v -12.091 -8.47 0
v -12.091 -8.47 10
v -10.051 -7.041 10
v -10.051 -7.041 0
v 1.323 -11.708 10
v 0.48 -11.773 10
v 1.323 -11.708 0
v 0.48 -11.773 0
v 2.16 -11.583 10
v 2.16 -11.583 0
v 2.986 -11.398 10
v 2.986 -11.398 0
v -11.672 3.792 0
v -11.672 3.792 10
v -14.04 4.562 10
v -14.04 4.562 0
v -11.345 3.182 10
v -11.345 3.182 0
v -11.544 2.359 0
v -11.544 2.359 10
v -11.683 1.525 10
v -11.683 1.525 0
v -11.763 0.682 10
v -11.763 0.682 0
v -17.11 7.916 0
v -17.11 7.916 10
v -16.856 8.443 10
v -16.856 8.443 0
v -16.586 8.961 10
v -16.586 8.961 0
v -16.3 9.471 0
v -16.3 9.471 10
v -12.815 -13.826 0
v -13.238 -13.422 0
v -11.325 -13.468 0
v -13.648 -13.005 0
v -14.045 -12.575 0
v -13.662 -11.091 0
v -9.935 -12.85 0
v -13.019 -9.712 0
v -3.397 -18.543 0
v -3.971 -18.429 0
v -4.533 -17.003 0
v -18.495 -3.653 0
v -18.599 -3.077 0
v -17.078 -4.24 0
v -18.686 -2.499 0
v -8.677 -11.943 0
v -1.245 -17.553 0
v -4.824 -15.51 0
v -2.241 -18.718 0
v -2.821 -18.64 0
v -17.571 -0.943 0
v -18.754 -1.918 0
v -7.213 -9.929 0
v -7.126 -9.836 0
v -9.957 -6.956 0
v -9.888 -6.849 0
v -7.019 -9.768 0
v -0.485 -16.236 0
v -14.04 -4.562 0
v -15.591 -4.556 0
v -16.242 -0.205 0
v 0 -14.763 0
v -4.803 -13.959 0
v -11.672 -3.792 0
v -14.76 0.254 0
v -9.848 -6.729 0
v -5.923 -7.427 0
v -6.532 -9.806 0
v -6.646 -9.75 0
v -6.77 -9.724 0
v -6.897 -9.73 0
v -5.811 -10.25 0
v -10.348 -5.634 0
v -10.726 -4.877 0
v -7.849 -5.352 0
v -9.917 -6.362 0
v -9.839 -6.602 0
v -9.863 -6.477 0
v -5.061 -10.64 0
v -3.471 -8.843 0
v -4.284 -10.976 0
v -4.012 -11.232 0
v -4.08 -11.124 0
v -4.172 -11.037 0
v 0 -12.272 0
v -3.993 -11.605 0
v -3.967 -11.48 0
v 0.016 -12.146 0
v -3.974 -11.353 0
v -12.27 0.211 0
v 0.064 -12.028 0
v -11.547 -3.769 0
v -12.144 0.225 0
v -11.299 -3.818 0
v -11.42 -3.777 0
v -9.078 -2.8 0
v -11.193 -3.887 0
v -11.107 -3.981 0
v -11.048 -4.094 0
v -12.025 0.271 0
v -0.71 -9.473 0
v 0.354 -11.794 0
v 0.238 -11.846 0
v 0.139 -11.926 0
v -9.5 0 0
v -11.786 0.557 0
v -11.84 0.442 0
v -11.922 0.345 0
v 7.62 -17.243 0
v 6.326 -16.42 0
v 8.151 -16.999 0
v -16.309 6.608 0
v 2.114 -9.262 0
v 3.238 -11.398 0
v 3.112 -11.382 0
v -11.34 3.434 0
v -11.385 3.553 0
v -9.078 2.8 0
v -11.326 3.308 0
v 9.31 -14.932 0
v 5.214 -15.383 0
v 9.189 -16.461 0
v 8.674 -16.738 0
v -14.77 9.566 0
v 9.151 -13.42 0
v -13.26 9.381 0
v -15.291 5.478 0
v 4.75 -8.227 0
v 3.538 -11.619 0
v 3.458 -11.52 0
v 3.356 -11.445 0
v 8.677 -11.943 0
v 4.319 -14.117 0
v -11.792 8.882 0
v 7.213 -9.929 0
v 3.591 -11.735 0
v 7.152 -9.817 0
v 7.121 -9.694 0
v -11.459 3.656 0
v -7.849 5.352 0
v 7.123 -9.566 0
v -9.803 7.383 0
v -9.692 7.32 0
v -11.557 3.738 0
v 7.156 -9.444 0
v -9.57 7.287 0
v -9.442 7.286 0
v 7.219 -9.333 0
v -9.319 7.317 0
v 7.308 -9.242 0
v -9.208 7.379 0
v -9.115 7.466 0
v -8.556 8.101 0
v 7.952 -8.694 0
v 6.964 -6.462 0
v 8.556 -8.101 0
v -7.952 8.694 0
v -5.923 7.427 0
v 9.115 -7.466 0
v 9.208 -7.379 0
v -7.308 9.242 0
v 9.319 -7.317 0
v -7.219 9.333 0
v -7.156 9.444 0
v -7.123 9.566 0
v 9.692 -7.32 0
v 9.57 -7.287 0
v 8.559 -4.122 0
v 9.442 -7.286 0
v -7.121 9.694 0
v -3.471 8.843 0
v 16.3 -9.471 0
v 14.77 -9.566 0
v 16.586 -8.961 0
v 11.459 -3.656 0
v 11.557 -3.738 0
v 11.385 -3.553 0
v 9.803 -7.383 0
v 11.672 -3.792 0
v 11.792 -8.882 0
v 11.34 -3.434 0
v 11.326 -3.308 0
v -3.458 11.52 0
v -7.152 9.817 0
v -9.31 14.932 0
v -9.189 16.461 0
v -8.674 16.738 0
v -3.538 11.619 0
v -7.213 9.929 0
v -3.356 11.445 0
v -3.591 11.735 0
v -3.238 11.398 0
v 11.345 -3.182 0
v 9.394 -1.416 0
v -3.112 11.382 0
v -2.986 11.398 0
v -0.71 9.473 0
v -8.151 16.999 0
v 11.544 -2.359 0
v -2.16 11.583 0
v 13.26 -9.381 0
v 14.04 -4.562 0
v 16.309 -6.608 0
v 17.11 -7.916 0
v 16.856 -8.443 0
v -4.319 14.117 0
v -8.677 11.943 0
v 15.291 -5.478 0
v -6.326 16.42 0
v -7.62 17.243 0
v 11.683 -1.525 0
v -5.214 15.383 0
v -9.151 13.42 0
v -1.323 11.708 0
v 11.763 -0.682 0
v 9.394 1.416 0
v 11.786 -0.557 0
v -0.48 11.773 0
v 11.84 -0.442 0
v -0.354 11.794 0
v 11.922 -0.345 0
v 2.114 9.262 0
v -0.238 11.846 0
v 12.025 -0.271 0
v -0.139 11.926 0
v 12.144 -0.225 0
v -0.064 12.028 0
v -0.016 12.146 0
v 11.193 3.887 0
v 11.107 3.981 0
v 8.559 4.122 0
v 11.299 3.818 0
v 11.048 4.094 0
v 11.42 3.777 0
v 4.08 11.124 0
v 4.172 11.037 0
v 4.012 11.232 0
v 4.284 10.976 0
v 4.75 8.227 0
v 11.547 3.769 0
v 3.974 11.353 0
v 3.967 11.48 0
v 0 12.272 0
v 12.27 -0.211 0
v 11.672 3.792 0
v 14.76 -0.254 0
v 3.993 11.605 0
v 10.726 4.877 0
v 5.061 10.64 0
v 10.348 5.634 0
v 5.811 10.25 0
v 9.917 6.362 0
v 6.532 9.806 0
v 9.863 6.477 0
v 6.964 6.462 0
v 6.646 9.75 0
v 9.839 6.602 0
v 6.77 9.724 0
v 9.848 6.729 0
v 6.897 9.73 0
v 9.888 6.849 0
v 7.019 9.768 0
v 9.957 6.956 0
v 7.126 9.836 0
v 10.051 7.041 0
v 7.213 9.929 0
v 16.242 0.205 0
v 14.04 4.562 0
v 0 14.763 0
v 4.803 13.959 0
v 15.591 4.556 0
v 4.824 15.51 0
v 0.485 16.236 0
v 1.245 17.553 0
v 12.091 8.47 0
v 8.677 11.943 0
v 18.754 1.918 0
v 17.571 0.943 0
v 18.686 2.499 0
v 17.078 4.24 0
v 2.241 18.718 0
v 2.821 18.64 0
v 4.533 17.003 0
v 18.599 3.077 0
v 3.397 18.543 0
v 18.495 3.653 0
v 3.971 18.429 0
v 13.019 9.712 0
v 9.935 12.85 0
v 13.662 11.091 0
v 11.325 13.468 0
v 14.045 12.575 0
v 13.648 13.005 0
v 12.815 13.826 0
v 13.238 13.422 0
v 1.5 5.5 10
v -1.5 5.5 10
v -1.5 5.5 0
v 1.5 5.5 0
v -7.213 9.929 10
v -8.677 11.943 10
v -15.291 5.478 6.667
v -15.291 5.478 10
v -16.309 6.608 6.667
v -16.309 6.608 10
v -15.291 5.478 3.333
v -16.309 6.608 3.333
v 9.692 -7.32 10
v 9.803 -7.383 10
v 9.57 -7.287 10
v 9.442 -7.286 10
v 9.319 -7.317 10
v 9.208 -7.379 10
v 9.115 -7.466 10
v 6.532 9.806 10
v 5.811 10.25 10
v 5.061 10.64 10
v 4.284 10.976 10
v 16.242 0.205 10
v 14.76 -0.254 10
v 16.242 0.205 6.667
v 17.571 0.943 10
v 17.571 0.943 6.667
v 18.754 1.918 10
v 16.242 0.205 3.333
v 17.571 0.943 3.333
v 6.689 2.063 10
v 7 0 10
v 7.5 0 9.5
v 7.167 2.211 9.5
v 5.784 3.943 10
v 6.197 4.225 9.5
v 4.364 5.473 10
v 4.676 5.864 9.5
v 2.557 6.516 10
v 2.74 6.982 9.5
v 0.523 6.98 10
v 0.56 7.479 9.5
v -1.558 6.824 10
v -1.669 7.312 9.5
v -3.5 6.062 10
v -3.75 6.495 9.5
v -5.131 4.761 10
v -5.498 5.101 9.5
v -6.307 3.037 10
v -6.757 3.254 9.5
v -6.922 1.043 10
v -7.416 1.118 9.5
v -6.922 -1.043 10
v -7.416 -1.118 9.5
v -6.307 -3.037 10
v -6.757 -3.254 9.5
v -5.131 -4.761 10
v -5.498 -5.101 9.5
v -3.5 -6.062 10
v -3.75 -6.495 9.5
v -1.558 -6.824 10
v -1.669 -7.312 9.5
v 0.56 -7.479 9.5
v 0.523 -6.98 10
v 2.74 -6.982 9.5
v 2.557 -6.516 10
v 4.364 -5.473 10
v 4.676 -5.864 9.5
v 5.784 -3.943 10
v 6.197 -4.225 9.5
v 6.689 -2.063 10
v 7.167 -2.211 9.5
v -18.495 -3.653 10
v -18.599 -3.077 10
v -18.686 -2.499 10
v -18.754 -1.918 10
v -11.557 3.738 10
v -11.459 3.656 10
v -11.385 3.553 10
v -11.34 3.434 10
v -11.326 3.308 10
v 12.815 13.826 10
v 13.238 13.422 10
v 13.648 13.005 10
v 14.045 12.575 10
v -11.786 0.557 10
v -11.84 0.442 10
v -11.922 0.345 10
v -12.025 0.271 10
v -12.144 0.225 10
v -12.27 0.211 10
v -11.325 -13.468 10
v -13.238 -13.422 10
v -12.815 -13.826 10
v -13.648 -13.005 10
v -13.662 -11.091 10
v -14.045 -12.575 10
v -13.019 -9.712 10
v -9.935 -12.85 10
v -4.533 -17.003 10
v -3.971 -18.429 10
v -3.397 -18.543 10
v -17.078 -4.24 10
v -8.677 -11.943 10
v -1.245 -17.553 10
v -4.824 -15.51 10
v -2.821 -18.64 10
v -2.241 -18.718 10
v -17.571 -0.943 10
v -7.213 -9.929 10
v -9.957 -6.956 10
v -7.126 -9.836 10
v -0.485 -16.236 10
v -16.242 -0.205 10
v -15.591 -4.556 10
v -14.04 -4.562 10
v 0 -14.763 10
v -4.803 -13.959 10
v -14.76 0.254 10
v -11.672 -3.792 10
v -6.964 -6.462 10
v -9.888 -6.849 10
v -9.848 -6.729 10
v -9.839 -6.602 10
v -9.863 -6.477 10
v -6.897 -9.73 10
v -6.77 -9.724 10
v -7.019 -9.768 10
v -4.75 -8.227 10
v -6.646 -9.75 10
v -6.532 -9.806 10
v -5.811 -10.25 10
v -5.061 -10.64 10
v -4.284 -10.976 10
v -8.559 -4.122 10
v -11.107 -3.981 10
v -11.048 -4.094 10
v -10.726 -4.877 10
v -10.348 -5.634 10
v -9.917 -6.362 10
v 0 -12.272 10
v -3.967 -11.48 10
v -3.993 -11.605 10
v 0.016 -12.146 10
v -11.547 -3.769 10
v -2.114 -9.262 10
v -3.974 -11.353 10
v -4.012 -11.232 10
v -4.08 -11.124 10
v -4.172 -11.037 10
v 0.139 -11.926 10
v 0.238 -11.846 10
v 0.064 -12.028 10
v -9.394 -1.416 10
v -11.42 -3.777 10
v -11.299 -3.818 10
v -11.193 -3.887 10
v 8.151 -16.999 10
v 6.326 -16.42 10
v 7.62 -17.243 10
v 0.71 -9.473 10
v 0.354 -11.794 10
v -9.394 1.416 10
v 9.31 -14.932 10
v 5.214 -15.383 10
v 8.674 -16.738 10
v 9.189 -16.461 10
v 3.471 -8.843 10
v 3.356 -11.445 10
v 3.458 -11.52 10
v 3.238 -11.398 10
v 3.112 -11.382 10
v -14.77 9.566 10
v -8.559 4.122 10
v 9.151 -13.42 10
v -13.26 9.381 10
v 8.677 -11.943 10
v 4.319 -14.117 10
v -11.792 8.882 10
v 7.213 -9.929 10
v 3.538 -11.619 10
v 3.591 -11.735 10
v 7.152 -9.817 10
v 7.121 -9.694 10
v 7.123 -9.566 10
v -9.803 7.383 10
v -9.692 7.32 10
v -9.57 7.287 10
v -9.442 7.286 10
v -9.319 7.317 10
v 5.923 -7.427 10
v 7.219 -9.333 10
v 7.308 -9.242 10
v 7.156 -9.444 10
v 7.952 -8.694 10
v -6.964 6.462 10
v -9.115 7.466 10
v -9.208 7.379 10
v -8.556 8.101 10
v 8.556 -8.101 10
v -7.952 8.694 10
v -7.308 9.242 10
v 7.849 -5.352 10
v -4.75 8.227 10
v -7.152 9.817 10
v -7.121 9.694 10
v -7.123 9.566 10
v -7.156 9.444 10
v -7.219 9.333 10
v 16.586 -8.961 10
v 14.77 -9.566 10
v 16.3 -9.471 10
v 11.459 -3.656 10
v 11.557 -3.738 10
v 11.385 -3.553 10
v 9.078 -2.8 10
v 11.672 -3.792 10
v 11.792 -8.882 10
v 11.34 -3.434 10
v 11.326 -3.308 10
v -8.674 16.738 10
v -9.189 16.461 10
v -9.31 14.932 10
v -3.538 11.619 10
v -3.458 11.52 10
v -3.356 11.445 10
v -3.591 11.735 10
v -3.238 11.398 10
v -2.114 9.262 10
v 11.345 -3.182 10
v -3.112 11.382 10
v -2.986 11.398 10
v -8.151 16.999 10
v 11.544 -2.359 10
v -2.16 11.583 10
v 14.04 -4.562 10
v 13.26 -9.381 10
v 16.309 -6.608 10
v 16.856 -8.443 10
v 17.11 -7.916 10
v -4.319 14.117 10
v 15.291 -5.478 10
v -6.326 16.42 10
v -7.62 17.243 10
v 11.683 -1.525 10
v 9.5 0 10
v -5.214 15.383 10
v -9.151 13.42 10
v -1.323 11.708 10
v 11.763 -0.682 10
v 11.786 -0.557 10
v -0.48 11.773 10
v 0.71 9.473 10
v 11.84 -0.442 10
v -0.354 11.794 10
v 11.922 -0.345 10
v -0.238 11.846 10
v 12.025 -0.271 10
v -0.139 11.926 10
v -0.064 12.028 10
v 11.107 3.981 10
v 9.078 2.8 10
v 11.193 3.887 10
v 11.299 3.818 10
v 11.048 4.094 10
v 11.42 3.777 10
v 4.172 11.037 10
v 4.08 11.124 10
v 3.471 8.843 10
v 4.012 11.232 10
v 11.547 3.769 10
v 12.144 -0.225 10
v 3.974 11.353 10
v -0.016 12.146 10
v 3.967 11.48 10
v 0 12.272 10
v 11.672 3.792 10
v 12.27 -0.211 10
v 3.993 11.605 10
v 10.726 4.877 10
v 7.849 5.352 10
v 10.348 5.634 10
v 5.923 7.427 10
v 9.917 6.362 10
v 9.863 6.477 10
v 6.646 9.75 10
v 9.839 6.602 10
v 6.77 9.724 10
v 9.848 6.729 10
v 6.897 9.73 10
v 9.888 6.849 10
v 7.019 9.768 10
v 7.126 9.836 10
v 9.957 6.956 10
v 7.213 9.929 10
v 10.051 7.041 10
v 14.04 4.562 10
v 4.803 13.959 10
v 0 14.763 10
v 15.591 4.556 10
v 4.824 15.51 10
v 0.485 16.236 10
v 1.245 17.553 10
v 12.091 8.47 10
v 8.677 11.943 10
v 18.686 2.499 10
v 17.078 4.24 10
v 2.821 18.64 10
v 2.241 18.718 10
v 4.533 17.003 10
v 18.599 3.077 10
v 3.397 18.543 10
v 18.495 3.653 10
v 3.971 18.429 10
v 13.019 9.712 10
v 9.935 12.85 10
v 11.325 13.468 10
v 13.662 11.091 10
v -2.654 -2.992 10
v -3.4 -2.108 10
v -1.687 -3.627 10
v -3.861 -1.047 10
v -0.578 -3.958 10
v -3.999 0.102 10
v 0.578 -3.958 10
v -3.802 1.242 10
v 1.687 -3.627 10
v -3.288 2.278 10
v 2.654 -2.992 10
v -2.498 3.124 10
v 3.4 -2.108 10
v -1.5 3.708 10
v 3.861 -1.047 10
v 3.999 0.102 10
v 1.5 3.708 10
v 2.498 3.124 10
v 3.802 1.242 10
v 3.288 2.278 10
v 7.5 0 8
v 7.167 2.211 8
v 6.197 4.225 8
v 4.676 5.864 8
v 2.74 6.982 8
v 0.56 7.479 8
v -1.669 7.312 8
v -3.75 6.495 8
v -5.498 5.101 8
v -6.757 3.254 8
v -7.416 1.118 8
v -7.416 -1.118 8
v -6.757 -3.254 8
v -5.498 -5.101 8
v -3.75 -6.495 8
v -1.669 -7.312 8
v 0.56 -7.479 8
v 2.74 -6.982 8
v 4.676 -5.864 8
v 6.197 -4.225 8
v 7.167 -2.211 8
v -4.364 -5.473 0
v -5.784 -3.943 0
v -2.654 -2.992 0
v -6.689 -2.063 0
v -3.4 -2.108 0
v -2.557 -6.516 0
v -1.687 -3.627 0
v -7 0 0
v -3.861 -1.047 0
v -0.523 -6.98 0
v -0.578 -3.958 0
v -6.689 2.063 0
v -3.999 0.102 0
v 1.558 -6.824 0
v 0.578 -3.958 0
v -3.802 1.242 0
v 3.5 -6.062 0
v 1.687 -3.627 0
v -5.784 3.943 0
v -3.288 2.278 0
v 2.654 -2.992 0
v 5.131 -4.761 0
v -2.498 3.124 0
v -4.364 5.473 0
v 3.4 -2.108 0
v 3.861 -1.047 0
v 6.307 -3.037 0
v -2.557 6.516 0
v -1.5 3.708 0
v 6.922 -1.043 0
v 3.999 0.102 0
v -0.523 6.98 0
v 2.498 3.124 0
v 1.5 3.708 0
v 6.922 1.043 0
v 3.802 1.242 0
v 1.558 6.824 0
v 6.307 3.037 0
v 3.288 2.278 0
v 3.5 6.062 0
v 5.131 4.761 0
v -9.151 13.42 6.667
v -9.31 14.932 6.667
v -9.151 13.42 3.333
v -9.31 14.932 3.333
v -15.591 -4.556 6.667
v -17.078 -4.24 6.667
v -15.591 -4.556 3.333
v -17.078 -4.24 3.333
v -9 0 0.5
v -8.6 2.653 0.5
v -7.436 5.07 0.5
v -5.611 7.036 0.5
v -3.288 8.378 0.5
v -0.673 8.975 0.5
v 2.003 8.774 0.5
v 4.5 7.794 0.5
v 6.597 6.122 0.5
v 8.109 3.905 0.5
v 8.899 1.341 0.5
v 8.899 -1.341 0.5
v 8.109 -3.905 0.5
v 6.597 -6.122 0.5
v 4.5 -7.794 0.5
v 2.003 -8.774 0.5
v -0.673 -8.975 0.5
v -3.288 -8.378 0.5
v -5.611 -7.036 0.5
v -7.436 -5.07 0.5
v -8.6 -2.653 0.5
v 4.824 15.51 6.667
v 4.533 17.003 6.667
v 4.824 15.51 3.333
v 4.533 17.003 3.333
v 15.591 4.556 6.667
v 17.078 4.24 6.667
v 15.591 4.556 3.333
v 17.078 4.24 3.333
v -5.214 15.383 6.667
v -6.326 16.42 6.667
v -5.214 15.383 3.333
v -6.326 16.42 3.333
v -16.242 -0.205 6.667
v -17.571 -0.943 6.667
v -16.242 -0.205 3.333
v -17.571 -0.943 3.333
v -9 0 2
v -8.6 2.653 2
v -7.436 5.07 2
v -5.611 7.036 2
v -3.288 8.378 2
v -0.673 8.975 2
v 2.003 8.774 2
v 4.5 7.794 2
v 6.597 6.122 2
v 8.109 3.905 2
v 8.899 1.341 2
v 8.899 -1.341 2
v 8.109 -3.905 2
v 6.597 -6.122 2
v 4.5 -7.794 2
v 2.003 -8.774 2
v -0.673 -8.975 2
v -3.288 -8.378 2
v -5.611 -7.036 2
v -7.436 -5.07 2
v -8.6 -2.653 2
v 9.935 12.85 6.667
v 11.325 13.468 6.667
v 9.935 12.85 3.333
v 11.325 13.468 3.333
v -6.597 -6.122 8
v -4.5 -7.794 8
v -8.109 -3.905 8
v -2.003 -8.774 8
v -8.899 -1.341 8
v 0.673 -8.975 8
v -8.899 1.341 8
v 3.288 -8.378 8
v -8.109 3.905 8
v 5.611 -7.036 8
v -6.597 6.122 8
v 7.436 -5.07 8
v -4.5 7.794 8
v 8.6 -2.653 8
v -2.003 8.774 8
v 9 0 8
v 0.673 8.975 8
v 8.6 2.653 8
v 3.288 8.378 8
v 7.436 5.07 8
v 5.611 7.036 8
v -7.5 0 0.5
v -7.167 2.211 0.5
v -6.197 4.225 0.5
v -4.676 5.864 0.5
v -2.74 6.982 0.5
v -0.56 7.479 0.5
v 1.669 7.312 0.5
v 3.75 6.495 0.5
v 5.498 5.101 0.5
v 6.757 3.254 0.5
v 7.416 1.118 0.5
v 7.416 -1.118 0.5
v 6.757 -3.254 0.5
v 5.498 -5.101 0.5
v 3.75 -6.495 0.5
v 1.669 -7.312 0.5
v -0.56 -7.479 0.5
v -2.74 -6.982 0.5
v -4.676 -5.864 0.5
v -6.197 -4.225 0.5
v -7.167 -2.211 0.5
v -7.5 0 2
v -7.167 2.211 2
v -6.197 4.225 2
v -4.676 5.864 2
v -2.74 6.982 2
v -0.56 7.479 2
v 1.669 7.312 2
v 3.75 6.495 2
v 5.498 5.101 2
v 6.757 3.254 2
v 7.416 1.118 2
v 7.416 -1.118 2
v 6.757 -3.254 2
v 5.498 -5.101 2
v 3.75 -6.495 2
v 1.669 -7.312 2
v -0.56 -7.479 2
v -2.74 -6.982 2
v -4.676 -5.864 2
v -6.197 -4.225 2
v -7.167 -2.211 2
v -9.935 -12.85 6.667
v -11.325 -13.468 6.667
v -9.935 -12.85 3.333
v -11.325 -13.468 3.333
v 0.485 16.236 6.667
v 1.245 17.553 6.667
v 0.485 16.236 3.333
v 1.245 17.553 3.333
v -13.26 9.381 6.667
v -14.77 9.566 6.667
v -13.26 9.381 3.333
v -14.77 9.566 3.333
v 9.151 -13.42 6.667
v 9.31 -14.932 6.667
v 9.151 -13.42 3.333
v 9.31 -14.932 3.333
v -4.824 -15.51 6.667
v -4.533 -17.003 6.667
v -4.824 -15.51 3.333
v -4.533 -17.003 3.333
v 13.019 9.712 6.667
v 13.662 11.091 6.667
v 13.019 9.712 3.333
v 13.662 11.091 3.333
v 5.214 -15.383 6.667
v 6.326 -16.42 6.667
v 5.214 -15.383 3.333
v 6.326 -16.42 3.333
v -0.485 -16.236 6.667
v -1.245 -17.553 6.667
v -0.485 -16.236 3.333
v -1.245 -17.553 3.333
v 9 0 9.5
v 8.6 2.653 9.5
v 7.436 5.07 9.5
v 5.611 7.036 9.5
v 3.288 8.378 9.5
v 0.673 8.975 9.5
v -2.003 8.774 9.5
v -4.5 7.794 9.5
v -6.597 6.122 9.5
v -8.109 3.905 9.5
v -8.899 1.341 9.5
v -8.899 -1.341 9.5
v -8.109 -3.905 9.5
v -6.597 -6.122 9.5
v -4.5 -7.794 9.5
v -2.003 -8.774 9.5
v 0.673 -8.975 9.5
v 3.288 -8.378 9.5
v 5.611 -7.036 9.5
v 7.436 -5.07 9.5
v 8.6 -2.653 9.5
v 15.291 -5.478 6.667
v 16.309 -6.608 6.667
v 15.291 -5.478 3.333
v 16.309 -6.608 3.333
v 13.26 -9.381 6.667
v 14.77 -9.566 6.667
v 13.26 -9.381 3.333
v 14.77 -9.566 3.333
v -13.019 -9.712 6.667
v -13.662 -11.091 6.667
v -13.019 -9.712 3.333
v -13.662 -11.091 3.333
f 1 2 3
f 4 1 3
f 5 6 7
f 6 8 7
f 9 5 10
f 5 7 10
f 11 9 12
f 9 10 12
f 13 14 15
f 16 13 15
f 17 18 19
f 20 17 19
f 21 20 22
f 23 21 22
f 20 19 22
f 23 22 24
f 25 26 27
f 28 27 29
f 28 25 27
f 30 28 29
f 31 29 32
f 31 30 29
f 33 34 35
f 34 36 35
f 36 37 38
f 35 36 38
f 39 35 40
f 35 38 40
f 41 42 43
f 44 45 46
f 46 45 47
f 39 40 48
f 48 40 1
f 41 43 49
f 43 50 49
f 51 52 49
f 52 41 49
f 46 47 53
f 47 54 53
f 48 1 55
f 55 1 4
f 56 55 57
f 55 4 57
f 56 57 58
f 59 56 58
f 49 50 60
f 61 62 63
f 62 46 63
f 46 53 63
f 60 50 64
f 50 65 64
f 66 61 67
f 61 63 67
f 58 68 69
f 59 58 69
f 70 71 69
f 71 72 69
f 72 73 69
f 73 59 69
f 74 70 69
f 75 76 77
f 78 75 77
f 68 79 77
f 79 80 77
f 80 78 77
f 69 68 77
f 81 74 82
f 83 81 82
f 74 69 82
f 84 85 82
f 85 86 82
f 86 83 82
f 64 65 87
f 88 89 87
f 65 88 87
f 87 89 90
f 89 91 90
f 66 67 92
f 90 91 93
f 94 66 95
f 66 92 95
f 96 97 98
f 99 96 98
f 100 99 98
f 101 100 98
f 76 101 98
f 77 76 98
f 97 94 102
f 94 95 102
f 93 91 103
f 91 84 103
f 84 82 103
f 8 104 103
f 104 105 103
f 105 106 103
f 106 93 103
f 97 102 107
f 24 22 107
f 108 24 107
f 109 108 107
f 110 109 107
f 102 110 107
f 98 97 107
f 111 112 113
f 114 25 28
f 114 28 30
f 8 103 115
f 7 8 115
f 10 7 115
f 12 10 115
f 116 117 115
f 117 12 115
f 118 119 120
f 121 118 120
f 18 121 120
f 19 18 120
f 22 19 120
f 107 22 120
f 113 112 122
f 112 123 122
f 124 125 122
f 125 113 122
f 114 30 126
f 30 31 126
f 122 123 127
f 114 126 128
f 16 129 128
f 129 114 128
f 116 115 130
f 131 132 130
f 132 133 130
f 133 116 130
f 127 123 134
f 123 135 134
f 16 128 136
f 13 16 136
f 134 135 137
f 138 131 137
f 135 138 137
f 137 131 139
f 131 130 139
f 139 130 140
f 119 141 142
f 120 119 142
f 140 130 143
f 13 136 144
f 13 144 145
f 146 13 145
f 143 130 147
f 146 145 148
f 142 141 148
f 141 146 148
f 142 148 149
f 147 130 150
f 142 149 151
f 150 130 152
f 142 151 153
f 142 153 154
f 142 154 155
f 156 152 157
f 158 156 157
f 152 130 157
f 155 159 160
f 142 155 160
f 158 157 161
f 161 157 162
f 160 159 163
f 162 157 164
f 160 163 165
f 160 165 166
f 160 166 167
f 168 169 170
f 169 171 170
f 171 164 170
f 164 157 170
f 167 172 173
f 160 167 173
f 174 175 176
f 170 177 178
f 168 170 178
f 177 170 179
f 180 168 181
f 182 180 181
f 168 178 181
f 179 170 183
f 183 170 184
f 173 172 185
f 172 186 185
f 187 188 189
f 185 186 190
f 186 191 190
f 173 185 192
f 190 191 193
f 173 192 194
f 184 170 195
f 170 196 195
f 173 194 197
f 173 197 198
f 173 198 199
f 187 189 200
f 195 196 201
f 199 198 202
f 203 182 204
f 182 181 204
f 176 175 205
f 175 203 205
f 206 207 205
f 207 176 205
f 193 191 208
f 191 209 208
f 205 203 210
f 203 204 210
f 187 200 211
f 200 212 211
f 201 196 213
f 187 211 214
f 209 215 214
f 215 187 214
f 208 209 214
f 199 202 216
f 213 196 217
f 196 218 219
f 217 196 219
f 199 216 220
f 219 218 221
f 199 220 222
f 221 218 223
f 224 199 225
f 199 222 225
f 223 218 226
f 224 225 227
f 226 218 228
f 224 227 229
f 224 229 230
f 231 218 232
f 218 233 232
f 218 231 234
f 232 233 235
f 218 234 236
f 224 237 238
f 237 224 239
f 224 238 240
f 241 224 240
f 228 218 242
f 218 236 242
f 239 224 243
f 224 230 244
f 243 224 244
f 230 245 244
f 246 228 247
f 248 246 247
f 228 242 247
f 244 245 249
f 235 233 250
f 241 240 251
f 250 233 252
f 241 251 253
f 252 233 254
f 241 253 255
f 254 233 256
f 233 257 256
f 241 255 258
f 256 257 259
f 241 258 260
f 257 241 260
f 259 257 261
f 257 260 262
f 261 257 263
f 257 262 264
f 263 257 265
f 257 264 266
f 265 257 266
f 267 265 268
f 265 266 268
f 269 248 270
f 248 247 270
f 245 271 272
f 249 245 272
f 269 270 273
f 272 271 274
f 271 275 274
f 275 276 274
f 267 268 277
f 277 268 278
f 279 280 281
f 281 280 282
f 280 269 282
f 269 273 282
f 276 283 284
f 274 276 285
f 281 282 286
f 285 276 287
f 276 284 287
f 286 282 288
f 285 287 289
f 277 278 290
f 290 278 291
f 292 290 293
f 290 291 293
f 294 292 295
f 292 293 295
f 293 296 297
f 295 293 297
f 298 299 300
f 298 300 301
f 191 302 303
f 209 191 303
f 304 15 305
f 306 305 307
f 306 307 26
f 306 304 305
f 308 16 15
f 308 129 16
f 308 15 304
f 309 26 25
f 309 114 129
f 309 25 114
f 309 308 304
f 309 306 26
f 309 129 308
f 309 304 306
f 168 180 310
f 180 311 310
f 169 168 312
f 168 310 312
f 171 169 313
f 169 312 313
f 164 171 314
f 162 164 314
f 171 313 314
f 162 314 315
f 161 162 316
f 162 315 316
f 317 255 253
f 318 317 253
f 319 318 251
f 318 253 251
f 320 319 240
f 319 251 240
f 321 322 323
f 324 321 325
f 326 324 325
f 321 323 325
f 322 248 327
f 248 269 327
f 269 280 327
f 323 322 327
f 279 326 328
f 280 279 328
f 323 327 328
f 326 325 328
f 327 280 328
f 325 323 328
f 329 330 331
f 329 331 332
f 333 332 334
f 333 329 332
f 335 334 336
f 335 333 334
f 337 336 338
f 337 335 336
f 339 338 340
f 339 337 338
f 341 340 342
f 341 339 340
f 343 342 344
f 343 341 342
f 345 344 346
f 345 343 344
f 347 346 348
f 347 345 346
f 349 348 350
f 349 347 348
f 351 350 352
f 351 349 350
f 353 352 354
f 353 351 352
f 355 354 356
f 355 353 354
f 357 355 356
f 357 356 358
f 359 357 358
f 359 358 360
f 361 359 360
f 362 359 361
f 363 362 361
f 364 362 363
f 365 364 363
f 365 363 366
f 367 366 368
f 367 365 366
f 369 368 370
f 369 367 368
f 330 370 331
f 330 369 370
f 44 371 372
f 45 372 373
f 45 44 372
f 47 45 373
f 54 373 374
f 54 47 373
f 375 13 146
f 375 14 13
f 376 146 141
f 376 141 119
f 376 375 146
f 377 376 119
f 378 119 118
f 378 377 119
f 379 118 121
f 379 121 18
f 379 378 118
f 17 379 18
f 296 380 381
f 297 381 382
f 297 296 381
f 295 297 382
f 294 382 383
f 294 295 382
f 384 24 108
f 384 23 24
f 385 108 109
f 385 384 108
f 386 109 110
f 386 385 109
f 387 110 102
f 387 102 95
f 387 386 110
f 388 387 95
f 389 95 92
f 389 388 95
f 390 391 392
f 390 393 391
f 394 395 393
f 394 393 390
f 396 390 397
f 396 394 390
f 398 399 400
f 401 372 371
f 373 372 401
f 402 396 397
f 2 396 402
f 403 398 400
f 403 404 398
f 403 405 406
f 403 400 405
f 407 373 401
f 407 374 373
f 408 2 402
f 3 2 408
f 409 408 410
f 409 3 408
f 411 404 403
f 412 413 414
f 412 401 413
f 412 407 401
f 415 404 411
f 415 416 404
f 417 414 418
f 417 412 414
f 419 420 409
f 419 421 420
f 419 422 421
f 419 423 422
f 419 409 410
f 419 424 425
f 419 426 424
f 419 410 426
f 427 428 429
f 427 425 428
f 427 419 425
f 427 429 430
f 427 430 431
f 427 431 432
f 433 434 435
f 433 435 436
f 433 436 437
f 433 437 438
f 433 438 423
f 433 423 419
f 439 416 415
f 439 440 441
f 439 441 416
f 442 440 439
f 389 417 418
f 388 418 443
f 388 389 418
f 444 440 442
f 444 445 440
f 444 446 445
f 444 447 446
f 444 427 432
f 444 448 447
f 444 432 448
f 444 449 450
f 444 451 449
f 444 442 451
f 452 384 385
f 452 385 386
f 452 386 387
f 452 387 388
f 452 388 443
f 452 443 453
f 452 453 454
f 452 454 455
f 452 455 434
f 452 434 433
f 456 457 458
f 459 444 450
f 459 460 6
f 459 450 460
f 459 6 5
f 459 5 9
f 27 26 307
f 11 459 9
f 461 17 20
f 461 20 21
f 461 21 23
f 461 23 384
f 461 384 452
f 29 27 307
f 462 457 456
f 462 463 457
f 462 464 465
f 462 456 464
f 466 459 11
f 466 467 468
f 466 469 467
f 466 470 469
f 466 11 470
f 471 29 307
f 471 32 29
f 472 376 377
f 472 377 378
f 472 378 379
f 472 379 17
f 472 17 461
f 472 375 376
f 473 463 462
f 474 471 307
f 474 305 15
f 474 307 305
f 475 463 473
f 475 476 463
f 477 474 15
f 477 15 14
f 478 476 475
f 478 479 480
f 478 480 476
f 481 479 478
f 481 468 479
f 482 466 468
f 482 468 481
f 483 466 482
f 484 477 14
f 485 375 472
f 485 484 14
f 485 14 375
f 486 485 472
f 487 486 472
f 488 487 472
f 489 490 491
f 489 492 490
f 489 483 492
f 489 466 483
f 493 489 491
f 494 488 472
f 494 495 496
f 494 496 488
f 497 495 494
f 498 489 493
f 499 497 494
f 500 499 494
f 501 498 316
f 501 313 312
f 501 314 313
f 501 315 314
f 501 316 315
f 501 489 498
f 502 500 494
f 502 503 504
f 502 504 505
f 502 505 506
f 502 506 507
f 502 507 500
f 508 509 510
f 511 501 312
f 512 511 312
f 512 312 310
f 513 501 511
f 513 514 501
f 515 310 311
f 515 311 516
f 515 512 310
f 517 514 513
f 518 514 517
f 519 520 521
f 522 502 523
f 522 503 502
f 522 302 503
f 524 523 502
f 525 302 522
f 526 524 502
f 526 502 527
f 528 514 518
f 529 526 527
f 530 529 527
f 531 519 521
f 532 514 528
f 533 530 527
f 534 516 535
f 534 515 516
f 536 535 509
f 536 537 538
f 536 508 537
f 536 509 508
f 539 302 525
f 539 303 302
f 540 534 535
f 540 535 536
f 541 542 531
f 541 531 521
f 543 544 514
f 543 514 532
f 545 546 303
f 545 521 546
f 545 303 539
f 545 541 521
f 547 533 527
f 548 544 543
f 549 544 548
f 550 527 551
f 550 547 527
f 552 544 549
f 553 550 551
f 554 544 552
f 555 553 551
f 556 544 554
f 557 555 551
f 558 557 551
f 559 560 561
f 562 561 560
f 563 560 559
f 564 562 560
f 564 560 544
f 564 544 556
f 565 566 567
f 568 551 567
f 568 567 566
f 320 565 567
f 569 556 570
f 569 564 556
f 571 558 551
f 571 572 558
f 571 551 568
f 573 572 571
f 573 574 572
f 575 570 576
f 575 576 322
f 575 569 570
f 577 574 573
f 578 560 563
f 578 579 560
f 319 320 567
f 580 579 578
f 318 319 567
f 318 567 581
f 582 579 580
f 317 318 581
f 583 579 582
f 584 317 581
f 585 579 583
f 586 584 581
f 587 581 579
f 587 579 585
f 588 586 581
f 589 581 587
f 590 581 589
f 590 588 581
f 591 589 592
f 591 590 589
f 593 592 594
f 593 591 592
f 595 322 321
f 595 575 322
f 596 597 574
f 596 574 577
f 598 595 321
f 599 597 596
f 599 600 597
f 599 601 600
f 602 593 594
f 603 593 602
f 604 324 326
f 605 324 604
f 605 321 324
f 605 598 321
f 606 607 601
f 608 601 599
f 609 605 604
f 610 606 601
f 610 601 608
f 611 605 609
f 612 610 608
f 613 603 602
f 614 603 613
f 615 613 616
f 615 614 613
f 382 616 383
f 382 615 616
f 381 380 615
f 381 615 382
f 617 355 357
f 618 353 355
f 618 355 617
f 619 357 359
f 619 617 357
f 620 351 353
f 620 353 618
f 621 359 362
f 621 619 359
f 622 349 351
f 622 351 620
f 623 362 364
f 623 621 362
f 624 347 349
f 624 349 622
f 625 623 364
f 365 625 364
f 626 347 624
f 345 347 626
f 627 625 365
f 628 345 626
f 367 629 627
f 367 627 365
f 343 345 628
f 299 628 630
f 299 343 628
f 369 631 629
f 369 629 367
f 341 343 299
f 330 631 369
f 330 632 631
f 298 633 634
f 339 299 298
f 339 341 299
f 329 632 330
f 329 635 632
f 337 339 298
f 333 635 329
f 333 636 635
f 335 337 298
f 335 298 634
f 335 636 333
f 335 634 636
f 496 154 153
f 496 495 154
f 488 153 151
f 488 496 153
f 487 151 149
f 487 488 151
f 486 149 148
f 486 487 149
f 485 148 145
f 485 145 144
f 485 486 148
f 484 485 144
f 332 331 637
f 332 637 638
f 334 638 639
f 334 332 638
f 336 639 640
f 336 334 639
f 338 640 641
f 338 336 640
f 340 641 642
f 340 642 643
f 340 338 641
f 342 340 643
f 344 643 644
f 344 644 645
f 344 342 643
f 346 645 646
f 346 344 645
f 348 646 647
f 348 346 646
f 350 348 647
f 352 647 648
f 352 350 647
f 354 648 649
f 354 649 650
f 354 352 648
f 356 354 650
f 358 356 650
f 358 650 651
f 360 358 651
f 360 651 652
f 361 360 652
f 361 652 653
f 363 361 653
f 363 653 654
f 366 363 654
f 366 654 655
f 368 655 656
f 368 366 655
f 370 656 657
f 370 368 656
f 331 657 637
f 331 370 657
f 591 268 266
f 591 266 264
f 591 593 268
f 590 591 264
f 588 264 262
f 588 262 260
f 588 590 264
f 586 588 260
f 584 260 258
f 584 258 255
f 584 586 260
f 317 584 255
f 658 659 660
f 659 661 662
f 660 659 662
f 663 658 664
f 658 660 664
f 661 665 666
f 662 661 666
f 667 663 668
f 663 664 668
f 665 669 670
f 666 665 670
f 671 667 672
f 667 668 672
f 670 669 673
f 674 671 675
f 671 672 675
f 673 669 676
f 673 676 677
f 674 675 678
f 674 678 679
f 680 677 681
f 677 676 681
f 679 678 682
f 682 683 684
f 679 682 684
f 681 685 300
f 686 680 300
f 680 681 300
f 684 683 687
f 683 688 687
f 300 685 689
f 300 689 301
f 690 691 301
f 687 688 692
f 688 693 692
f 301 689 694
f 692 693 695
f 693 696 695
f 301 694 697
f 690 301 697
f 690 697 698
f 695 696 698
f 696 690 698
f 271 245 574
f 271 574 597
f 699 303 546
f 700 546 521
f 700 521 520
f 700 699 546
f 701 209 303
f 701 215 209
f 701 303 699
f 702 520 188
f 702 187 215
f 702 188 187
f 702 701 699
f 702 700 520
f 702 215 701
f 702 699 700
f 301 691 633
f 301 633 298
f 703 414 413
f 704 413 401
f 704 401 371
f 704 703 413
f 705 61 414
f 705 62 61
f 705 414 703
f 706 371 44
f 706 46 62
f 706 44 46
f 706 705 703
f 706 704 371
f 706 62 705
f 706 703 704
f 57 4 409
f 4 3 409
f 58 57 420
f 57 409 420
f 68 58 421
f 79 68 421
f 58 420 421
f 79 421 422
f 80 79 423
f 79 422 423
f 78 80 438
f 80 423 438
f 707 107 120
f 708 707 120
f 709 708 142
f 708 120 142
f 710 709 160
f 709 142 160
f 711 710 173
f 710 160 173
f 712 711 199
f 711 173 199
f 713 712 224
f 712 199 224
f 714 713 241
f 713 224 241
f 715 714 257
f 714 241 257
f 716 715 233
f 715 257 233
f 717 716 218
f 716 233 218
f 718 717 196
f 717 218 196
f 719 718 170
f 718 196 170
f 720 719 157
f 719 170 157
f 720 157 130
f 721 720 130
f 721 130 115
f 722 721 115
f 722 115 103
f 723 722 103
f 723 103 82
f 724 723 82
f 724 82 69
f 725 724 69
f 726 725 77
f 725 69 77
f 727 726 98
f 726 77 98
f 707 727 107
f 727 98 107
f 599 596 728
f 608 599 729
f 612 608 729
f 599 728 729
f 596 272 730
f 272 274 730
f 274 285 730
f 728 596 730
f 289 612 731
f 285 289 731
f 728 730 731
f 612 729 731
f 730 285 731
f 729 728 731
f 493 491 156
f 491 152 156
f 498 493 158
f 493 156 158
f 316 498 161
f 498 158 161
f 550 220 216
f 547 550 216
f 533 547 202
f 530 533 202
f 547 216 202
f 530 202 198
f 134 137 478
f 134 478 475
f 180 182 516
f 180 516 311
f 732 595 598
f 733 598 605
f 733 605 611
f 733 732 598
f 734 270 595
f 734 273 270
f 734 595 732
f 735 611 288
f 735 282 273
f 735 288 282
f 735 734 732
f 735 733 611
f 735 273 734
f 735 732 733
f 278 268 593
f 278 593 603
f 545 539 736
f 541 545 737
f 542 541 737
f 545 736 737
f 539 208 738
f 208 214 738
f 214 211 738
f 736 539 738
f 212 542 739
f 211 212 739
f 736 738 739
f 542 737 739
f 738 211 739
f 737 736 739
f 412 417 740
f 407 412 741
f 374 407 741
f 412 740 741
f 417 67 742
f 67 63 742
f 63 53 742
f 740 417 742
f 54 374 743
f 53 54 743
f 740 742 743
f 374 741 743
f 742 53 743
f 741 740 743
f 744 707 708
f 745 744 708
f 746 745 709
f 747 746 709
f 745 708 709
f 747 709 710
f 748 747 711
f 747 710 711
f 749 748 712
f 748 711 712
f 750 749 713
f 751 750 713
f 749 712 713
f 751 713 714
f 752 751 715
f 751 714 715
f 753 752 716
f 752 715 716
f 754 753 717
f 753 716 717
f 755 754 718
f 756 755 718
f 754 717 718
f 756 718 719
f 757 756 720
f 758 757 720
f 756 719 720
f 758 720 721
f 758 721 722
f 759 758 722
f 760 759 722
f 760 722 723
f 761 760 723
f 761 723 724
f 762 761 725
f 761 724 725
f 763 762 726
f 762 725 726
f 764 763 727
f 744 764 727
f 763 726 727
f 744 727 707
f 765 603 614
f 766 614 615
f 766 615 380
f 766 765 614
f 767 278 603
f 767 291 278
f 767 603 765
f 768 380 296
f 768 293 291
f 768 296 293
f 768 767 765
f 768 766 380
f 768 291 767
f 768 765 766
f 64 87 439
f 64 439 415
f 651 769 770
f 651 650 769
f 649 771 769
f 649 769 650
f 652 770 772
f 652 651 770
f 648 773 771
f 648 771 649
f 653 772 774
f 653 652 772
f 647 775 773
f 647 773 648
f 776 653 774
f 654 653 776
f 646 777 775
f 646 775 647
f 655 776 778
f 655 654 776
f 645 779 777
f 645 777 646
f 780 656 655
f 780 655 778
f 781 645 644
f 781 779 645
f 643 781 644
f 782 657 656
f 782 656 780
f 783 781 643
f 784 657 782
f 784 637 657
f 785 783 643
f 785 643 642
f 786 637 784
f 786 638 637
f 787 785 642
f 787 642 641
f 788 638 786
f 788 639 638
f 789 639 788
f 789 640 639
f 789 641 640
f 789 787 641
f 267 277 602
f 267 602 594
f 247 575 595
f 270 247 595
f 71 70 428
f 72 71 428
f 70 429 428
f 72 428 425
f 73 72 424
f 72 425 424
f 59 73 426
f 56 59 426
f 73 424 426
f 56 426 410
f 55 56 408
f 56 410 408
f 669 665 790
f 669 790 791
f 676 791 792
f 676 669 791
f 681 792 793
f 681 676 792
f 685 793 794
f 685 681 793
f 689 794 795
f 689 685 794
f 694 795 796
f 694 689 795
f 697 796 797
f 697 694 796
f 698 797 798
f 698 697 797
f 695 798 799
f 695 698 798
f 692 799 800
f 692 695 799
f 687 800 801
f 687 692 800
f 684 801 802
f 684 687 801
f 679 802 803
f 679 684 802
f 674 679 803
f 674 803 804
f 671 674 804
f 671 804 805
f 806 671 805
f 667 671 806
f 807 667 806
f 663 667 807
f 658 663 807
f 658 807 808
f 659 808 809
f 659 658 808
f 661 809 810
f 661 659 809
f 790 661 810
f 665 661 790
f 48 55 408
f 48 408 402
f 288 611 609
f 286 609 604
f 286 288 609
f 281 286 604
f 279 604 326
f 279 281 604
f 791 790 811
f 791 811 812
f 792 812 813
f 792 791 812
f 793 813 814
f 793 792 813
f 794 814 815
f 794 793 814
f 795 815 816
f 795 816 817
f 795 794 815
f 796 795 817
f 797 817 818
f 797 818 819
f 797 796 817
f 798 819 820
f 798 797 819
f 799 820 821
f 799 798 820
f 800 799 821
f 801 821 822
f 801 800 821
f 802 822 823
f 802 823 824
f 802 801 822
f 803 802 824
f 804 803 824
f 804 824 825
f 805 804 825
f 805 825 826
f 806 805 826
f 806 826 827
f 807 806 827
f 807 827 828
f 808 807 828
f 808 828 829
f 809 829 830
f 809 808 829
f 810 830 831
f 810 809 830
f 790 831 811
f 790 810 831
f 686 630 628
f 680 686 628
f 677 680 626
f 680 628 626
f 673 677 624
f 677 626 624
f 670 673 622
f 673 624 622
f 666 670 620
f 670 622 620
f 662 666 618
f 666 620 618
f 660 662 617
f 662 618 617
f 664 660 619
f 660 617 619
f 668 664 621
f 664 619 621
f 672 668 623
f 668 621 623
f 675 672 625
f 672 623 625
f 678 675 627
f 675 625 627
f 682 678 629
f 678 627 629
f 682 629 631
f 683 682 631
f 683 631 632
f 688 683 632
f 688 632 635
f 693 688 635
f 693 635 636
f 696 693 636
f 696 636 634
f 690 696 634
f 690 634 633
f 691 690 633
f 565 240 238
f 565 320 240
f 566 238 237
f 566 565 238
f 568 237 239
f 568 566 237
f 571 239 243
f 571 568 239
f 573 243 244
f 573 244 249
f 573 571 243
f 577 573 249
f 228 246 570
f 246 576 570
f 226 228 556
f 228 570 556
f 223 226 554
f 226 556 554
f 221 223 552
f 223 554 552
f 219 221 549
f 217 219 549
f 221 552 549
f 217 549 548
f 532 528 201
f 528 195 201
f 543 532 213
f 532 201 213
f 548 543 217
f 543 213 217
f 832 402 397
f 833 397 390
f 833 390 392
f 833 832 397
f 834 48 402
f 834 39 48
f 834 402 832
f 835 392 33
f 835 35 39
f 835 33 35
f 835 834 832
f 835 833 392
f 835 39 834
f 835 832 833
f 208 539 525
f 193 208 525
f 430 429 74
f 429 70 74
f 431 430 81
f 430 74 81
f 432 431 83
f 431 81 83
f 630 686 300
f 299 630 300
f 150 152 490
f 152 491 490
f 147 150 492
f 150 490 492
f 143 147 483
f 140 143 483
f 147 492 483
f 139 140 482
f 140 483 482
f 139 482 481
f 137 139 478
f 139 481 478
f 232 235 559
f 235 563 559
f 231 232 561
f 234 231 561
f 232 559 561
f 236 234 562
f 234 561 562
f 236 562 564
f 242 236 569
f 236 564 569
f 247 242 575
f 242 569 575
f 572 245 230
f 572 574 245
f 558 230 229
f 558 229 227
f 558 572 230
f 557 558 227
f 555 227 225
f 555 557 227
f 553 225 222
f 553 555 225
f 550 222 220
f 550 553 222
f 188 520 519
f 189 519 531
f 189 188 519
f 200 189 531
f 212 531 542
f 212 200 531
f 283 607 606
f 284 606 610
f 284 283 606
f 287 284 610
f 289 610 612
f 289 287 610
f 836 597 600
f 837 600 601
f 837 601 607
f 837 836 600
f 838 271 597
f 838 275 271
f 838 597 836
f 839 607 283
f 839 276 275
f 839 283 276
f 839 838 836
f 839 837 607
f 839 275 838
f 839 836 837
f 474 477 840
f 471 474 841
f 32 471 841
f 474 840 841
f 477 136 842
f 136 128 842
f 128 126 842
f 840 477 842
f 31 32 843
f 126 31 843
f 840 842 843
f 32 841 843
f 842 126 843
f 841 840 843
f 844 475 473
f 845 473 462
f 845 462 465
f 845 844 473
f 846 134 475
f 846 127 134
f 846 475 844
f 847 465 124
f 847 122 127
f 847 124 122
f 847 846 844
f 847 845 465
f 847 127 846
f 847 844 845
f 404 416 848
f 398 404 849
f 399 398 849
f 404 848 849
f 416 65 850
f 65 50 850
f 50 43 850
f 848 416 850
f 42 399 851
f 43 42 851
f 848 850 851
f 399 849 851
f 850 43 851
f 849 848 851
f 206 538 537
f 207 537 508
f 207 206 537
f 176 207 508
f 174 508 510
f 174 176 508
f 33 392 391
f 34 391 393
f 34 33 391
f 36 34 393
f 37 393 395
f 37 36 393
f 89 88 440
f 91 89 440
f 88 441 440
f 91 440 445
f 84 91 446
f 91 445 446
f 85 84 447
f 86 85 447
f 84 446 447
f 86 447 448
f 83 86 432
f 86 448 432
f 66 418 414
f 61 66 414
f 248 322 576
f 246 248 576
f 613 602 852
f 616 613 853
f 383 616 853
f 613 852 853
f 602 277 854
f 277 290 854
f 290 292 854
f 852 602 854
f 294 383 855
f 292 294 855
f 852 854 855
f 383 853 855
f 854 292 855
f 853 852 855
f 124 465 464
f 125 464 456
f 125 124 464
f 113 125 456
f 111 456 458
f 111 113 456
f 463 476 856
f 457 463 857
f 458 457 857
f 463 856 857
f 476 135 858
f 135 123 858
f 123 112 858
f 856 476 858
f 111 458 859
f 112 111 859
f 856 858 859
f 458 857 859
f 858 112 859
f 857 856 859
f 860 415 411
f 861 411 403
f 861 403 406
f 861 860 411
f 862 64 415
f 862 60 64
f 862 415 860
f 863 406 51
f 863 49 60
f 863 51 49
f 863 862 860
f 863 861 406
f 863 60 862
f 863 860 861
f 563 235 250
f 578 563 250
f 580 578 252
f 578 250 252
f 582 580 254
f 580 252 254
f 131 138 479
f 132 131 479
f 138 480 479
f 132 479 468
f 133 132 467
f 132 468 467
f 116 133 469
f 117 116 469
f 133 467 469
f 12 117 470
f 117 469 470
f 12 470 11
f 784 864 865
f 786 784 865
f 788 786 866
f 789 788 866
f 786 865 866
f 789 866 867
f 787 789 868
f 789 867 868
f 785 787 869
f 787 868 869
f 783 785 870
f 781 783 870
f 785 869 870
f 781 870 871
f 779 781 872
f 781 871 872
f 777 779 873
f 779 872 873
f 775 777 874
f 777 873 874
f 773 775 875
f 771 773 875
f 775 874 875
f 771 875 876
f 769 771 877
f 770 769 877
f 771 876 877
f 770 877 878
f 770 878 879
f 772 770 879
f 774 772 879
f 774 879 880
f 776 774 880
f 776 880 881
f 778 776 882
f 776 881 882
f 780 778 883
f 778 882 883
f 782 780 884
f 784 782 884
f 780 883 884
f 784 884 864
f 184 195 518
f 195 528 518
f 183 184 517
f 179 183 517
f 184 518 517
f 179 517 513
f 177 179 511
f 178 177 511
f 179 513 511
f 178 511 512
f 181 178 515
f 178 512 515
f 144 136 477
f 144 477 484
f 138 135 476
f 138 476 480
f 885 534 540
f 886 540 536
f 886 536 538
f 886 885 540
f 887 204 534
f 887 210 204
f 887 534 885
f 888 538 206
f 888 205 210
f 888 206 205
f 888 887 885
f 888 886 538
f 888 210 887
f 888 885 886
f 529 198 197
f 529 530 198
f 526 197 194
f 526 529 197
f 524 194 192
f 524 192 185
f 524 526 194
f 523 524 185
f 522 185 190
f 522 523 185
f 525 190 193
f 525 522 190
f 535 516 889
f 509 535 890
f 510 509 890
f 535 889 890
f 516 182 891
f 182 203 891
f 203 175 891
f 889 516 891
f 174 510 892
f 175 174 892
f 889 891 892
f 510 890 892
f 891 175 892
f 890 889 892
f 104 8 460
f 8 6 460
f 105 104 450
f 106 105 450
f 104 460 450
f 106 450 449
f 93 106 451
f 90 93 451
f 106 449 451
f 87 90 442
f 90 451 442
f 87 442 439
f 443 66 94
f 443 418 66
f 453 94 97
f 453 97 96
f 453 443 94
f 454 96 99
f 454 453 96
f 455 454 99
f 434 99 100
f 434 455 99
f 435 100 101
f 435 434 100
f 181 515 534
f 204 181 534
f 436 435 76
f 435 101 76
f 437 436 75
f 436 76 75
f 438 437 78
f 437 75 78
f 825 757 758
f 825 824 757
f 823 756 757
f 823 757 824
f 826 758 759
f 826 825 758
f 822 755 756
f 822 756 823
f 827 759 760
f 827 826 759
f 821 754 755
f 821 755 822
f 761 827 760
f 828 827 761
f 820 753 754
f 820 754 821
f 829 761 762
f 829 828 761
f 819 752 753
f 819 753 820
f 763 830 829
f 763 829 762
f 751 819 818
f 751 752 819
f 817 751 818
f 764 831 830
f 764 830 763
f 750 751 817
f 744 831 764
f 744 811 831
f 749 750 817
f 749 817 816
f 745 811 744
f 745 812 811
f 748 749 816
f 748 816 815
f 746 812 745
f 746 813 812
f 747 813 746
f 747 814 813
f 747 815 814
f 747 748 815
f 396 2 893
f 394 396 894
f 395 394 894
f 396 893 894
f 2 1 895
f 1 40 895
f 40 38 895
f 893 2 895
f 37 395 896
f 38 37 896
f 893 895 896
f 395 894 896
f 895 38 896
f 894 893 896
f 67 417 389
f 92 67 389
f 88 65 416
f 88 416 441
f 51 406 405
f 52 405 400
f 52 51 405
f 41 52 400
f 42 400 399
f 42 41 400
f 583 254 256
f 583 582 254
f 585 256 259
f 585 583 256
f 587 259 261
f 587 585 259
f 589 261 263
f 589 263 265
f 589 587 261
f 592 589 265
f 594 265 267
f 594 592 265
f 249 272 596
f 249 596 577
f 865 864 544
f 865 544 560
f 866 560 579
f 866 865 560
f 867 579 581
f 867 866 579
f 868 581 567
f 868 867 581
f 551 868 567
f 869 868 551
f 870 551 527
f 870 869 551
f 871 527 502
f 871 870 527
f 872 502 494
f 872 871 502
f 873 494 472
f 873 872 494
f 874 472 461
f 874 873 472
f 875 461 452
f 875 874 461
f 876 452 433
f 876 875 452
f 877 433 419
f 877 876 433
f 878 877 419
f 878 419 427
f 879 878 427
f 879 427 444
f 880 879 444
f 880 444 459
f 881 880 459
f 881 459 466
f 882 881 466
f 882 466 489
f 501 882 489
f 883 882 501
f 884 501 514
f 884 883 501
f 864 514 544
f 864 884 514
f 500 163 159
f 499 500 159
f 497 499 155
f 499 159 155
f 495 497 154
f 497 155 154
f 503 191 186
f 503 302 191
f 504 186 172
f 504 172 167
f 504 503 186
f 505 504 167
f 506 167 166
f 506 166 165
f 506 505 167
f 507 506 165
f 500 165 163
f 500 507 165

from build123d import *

# Parameters (mm, degrees)
BOSS_EXTRUDE1_DEPTH     = 10
CIRPATTERN1_COUNT       = 10
SKETCH1_R               = 11.7825
BOSS_EXTRUDE2_DEPTH     = 10
SKETCH4_R               = 9
SKETCH4_R_2             = 7.5
CUT_EXTRUDE1_DEPTH      = 2
SKETCH4_3_R             = 4
CUT_EXTRUDE2_DEPTH      = 29.32125352
CUT_EXTRUDE3_START      = -2
SKETCH5_R               = 9
SKETCH5_R_2             = 7.5
CUT_EXTRUDE3_DEPTH      = 2
FILLET1_R               = 0.5
CHAMFER1_SIZE           = 0.5
CHAMFER2_SIZE           = 0.5
CUT_EXTRUDE4_DEPTH      = 29.32125352
CUT_EXTRUDE4_DEPTH_BACK = 29.32125352
SKETCH6_W               = 3
SKETCH6_H               = 3


with BuildPart() as part:
    # Sketch3 → Boss-Extrude1 (new body)
    with BuildSketch(Plane.XY):
        with BuildLine():
            Line((4.803075617, 13.959368513), (3.833494733, 11.141437267))
            ThreePointArc((3.833494733, 11.141437267), (1.943363276, 11.621129266), (0, 11.7825))
            Line((0, 11.7825), (0, 14.762571073))
            add(Edge.make_bspline(
                [(0, 14.762571073), (0.333518774, 16.315241106), (1.140884964, 17.626707575), (2.241097954, 18.718316804)],
                knots=[0, 0, 0, 0, 0.256830749, 0.256830749, 0.256830749, 0.256830749], degree=3))
            ThreePointArc((2.241097954, 18.718316804), (3.109381242, 18.593806826), (3.970932877, 18.429042191))
            add(Edge.make_bspline(
                [(4.803075617, 13.959368513), (4.992871831, 15.536072798), (4.656124965, 17.038865536), (3.970932877, 18.429042191)],
                knots=[0, 0, 0, 0, 0.256830749, 0.256830749, 0.256830749, 0.256830749], degree=3))
        make_face()
    extrude(amount=BOSS_EXTRUDE1_DEPTH)


with BuildPart() as cirpattern1_1:
    # CirPattern1: pattern copy
    add(part.part.rotate(Axis((0, 0, 0), (0, 0, 1)), 1 * 360 / CIRPATTERN1_COUNT))


with BuildPart() as cirpattern1_2:
    # CirPattern1: pattern copy
    add(part.part.rotate(Axis((0, 0, 0), (0, 0, 1)), 2 * 360 / CIRPATTERN1_COUNT))


with BuildPart() as cirpattern1_3:
    # CirPattern1: pattern copy
    add(part.part.rotate(Axis((0, 0, 0), (0, 0, 1)), 3 * 360 / CIRPATTERN1_COUNT))


with BuildPart() as cirpattern1_4:
    # CirPattern1: pattern copy
    add(part.part.rotate(Axis((0, 0, 0), (0, 0, 1)), 4 * 360 / CIRPATTERN1_COUNT))


with BuildPart() as cirpattern1_5:
    # CirPattern1: pattern copy
    add(part.part.rotate(Axis((0, 0, 0), (0, 0, 1)), 5 * 360 / CIRPATTERN1_COUNT))


with BuildPart() as cirpattern1_6:
    # CirPattern1: pattern copy
    add(part.part.rotate(Axis((0, 0, 0), (0, 0, 1)), 6 * 360 / CIRPATTERN1_COUNT))


with BuildPart() as cirpattern1_7:
    # CirPattern1: pattern copy
    add(part.part.rotate(Axis((0, 0, 0), (0, 0, 1)), 7 * 360 / CIRPATTERN1_COUNT))


with BuildPart() as cirpattern1_8:
    # CirPattern1: pattern copy
    add(part.part.rotate(Axis((0, 0, 0), (0, 0, 1)), 8 * 360 / CIRPATTERN1_COUNT))


with BuildPart() as cirpattern1_9:
    # CirPattern1: pattern copy
    add(part.part.rotate(Axis((0, 0, 0), (0, 0, 1)), 9 * 360 / CIRPATTERN1_COUNT))


with BuildPart() as part_1:
    add(part.part)

    add(cirpattern1_1.part)  # Boss-Extrude2 merges CirPattern1_1

    add(cirpattern1_2.part)  # Boss-Extrude2 merges CirPattern1_2

    add(cirpattern1_3.part)  # Boss-Extrude2 merges CirPattern1_3

    add(cirpattern1_4.part)  # Boss-Extrude2 merges CirPattern1_4

    add(cirpattern1_5.part)  # Boss-Extrude2 merges CirPattern1_5

    add(cirpattern1_6.part)  # Boss-Extrude2 merges CirPattern1_6

    add(cirpattern1_7.part)  # Boss-Extrude2 merges CirPattern1_7

    add(cirpattern1_8.part)  # Boss-Extrude2 merges CirPattern1_8

    add(cirpattern1_9.part)  # Boss-Extrude2 merges CirPattern1_9
    # Sketch1 → Boss-Extrude2 (add)
    with BuildSketch(Plane.XY):
        Circle(SKETCH1_R)
    extrude(amount=BOSS_EXTRUDE2_DEPTH)

    # Sketch4 → Cut-Extrude1 (cut)
    with BuildSketch(Plane.XY.offset(10)):
        Circle(SKETCH4_R)
        Circle(SKETCH4_R_2, mode=Mode.SUBTRACT)
    extrude(amount=-CUT_EXTRUDE1_DEPTH, mode=Mode.SUBTRACT)

    # Sketch4<3> → Cut-Extrude2 (cut, through all)
    with BuildSketch(Plane.XY.offset(10)):
        Circle(SKETCH4_3_R)
    extrude(amount=-CUT_EXTRUDE2_DEPTH, mode=Mode.SUBTRACT)

    # Sketch5 → Cut-Extrude3 (cut)
    with BuildSketch(Plane(origin=(0, 0, 0), x_dir=(-1, 0, 0), z_dir=(0, 0, -1)).offset(CUT_EXTRUDE3_START)):
        Circle(SKETCH5_R)
        Circle(SKETCH5_R_2, mode=Mode.SUBTRACT)
    extrude(amount=CUT_EXTRUDE3_DEPTH, mode=Mode.SUBTRACT)

    # Fillet1
    fillet1_edges = [part_1.edges().sort_by_distance(p)[0] for p in [
        (-3.447410128, 11.26688376, 5),
        (-11.205823403, 3.640992736, 5),
        (-6.925579735, 9.532242736, 5),
        (-9.650134902, -6.760340422, 5),
        (-11.780751534, 0.202976689, 5),
        (-9.411521493, 7.088763604, 5),
        (0, 11.7825, 5),
        (6.925579735, 9.532242736, 5),
        (-3.833494733, -11.141437267, 5),
        (-11.205823403, -3.640992736, 5),
        (-6.925579735, -9.532242736, 5),
        (0, -11.7825, 5),
        (3.447410128, -11.26688376, 5),
        (9.411521493, -7.088763604, 5),
        (3.833494733, 11.141437267, 5),
        (6.925579735, -9.532242736, 5),
        (11.205823403, -3.640992736, 5),
        (11.780751534, -0.202976689, 5),
        (11.205823403, 3.640992736, 5),
        (9.650134902, 6.760340422, 5),
    ]]
    fillet(fillet1_edges, radius=FILLET1_R)

    # Chamfer1
    chamfer1_edges = [part_1.edges().sort_by_distance(p)[0] for p in [
        (7.5, 0, 0),
        (-7.5, 0, 10),
    ]]
    chamfer(chamfer1_edges, length=CHAMFER1_SIZE)

    # Chamfer2
    chamfer2_edges = [part_1.edges().sort_by_distance(p)[0] for p in [
        (-9, 0, 10),
        (9, 0, 0),
    ]]
    chamfer(chamfer2_edges, length=CHAMFER2_SIZE)

    # Sketch6 → Cut-Extrude4 (cut, two sides: drawn at the far end of the back side and taken through both)
    with BuildSketch(Plane.XY.offset(-CUT_EXTRUDE4_DEPTH_BACK)):
        with Locations((0, 4)):
            Rectangle(SKETCH6_W, SKETCH6_H)
    extrude(amount=CUT_EXTRUDE4_DEPTH + CUT_EXTRUDE4_DEPTH_BACK, mode=Mode.SUBTRACT)


solid = part_1.part
